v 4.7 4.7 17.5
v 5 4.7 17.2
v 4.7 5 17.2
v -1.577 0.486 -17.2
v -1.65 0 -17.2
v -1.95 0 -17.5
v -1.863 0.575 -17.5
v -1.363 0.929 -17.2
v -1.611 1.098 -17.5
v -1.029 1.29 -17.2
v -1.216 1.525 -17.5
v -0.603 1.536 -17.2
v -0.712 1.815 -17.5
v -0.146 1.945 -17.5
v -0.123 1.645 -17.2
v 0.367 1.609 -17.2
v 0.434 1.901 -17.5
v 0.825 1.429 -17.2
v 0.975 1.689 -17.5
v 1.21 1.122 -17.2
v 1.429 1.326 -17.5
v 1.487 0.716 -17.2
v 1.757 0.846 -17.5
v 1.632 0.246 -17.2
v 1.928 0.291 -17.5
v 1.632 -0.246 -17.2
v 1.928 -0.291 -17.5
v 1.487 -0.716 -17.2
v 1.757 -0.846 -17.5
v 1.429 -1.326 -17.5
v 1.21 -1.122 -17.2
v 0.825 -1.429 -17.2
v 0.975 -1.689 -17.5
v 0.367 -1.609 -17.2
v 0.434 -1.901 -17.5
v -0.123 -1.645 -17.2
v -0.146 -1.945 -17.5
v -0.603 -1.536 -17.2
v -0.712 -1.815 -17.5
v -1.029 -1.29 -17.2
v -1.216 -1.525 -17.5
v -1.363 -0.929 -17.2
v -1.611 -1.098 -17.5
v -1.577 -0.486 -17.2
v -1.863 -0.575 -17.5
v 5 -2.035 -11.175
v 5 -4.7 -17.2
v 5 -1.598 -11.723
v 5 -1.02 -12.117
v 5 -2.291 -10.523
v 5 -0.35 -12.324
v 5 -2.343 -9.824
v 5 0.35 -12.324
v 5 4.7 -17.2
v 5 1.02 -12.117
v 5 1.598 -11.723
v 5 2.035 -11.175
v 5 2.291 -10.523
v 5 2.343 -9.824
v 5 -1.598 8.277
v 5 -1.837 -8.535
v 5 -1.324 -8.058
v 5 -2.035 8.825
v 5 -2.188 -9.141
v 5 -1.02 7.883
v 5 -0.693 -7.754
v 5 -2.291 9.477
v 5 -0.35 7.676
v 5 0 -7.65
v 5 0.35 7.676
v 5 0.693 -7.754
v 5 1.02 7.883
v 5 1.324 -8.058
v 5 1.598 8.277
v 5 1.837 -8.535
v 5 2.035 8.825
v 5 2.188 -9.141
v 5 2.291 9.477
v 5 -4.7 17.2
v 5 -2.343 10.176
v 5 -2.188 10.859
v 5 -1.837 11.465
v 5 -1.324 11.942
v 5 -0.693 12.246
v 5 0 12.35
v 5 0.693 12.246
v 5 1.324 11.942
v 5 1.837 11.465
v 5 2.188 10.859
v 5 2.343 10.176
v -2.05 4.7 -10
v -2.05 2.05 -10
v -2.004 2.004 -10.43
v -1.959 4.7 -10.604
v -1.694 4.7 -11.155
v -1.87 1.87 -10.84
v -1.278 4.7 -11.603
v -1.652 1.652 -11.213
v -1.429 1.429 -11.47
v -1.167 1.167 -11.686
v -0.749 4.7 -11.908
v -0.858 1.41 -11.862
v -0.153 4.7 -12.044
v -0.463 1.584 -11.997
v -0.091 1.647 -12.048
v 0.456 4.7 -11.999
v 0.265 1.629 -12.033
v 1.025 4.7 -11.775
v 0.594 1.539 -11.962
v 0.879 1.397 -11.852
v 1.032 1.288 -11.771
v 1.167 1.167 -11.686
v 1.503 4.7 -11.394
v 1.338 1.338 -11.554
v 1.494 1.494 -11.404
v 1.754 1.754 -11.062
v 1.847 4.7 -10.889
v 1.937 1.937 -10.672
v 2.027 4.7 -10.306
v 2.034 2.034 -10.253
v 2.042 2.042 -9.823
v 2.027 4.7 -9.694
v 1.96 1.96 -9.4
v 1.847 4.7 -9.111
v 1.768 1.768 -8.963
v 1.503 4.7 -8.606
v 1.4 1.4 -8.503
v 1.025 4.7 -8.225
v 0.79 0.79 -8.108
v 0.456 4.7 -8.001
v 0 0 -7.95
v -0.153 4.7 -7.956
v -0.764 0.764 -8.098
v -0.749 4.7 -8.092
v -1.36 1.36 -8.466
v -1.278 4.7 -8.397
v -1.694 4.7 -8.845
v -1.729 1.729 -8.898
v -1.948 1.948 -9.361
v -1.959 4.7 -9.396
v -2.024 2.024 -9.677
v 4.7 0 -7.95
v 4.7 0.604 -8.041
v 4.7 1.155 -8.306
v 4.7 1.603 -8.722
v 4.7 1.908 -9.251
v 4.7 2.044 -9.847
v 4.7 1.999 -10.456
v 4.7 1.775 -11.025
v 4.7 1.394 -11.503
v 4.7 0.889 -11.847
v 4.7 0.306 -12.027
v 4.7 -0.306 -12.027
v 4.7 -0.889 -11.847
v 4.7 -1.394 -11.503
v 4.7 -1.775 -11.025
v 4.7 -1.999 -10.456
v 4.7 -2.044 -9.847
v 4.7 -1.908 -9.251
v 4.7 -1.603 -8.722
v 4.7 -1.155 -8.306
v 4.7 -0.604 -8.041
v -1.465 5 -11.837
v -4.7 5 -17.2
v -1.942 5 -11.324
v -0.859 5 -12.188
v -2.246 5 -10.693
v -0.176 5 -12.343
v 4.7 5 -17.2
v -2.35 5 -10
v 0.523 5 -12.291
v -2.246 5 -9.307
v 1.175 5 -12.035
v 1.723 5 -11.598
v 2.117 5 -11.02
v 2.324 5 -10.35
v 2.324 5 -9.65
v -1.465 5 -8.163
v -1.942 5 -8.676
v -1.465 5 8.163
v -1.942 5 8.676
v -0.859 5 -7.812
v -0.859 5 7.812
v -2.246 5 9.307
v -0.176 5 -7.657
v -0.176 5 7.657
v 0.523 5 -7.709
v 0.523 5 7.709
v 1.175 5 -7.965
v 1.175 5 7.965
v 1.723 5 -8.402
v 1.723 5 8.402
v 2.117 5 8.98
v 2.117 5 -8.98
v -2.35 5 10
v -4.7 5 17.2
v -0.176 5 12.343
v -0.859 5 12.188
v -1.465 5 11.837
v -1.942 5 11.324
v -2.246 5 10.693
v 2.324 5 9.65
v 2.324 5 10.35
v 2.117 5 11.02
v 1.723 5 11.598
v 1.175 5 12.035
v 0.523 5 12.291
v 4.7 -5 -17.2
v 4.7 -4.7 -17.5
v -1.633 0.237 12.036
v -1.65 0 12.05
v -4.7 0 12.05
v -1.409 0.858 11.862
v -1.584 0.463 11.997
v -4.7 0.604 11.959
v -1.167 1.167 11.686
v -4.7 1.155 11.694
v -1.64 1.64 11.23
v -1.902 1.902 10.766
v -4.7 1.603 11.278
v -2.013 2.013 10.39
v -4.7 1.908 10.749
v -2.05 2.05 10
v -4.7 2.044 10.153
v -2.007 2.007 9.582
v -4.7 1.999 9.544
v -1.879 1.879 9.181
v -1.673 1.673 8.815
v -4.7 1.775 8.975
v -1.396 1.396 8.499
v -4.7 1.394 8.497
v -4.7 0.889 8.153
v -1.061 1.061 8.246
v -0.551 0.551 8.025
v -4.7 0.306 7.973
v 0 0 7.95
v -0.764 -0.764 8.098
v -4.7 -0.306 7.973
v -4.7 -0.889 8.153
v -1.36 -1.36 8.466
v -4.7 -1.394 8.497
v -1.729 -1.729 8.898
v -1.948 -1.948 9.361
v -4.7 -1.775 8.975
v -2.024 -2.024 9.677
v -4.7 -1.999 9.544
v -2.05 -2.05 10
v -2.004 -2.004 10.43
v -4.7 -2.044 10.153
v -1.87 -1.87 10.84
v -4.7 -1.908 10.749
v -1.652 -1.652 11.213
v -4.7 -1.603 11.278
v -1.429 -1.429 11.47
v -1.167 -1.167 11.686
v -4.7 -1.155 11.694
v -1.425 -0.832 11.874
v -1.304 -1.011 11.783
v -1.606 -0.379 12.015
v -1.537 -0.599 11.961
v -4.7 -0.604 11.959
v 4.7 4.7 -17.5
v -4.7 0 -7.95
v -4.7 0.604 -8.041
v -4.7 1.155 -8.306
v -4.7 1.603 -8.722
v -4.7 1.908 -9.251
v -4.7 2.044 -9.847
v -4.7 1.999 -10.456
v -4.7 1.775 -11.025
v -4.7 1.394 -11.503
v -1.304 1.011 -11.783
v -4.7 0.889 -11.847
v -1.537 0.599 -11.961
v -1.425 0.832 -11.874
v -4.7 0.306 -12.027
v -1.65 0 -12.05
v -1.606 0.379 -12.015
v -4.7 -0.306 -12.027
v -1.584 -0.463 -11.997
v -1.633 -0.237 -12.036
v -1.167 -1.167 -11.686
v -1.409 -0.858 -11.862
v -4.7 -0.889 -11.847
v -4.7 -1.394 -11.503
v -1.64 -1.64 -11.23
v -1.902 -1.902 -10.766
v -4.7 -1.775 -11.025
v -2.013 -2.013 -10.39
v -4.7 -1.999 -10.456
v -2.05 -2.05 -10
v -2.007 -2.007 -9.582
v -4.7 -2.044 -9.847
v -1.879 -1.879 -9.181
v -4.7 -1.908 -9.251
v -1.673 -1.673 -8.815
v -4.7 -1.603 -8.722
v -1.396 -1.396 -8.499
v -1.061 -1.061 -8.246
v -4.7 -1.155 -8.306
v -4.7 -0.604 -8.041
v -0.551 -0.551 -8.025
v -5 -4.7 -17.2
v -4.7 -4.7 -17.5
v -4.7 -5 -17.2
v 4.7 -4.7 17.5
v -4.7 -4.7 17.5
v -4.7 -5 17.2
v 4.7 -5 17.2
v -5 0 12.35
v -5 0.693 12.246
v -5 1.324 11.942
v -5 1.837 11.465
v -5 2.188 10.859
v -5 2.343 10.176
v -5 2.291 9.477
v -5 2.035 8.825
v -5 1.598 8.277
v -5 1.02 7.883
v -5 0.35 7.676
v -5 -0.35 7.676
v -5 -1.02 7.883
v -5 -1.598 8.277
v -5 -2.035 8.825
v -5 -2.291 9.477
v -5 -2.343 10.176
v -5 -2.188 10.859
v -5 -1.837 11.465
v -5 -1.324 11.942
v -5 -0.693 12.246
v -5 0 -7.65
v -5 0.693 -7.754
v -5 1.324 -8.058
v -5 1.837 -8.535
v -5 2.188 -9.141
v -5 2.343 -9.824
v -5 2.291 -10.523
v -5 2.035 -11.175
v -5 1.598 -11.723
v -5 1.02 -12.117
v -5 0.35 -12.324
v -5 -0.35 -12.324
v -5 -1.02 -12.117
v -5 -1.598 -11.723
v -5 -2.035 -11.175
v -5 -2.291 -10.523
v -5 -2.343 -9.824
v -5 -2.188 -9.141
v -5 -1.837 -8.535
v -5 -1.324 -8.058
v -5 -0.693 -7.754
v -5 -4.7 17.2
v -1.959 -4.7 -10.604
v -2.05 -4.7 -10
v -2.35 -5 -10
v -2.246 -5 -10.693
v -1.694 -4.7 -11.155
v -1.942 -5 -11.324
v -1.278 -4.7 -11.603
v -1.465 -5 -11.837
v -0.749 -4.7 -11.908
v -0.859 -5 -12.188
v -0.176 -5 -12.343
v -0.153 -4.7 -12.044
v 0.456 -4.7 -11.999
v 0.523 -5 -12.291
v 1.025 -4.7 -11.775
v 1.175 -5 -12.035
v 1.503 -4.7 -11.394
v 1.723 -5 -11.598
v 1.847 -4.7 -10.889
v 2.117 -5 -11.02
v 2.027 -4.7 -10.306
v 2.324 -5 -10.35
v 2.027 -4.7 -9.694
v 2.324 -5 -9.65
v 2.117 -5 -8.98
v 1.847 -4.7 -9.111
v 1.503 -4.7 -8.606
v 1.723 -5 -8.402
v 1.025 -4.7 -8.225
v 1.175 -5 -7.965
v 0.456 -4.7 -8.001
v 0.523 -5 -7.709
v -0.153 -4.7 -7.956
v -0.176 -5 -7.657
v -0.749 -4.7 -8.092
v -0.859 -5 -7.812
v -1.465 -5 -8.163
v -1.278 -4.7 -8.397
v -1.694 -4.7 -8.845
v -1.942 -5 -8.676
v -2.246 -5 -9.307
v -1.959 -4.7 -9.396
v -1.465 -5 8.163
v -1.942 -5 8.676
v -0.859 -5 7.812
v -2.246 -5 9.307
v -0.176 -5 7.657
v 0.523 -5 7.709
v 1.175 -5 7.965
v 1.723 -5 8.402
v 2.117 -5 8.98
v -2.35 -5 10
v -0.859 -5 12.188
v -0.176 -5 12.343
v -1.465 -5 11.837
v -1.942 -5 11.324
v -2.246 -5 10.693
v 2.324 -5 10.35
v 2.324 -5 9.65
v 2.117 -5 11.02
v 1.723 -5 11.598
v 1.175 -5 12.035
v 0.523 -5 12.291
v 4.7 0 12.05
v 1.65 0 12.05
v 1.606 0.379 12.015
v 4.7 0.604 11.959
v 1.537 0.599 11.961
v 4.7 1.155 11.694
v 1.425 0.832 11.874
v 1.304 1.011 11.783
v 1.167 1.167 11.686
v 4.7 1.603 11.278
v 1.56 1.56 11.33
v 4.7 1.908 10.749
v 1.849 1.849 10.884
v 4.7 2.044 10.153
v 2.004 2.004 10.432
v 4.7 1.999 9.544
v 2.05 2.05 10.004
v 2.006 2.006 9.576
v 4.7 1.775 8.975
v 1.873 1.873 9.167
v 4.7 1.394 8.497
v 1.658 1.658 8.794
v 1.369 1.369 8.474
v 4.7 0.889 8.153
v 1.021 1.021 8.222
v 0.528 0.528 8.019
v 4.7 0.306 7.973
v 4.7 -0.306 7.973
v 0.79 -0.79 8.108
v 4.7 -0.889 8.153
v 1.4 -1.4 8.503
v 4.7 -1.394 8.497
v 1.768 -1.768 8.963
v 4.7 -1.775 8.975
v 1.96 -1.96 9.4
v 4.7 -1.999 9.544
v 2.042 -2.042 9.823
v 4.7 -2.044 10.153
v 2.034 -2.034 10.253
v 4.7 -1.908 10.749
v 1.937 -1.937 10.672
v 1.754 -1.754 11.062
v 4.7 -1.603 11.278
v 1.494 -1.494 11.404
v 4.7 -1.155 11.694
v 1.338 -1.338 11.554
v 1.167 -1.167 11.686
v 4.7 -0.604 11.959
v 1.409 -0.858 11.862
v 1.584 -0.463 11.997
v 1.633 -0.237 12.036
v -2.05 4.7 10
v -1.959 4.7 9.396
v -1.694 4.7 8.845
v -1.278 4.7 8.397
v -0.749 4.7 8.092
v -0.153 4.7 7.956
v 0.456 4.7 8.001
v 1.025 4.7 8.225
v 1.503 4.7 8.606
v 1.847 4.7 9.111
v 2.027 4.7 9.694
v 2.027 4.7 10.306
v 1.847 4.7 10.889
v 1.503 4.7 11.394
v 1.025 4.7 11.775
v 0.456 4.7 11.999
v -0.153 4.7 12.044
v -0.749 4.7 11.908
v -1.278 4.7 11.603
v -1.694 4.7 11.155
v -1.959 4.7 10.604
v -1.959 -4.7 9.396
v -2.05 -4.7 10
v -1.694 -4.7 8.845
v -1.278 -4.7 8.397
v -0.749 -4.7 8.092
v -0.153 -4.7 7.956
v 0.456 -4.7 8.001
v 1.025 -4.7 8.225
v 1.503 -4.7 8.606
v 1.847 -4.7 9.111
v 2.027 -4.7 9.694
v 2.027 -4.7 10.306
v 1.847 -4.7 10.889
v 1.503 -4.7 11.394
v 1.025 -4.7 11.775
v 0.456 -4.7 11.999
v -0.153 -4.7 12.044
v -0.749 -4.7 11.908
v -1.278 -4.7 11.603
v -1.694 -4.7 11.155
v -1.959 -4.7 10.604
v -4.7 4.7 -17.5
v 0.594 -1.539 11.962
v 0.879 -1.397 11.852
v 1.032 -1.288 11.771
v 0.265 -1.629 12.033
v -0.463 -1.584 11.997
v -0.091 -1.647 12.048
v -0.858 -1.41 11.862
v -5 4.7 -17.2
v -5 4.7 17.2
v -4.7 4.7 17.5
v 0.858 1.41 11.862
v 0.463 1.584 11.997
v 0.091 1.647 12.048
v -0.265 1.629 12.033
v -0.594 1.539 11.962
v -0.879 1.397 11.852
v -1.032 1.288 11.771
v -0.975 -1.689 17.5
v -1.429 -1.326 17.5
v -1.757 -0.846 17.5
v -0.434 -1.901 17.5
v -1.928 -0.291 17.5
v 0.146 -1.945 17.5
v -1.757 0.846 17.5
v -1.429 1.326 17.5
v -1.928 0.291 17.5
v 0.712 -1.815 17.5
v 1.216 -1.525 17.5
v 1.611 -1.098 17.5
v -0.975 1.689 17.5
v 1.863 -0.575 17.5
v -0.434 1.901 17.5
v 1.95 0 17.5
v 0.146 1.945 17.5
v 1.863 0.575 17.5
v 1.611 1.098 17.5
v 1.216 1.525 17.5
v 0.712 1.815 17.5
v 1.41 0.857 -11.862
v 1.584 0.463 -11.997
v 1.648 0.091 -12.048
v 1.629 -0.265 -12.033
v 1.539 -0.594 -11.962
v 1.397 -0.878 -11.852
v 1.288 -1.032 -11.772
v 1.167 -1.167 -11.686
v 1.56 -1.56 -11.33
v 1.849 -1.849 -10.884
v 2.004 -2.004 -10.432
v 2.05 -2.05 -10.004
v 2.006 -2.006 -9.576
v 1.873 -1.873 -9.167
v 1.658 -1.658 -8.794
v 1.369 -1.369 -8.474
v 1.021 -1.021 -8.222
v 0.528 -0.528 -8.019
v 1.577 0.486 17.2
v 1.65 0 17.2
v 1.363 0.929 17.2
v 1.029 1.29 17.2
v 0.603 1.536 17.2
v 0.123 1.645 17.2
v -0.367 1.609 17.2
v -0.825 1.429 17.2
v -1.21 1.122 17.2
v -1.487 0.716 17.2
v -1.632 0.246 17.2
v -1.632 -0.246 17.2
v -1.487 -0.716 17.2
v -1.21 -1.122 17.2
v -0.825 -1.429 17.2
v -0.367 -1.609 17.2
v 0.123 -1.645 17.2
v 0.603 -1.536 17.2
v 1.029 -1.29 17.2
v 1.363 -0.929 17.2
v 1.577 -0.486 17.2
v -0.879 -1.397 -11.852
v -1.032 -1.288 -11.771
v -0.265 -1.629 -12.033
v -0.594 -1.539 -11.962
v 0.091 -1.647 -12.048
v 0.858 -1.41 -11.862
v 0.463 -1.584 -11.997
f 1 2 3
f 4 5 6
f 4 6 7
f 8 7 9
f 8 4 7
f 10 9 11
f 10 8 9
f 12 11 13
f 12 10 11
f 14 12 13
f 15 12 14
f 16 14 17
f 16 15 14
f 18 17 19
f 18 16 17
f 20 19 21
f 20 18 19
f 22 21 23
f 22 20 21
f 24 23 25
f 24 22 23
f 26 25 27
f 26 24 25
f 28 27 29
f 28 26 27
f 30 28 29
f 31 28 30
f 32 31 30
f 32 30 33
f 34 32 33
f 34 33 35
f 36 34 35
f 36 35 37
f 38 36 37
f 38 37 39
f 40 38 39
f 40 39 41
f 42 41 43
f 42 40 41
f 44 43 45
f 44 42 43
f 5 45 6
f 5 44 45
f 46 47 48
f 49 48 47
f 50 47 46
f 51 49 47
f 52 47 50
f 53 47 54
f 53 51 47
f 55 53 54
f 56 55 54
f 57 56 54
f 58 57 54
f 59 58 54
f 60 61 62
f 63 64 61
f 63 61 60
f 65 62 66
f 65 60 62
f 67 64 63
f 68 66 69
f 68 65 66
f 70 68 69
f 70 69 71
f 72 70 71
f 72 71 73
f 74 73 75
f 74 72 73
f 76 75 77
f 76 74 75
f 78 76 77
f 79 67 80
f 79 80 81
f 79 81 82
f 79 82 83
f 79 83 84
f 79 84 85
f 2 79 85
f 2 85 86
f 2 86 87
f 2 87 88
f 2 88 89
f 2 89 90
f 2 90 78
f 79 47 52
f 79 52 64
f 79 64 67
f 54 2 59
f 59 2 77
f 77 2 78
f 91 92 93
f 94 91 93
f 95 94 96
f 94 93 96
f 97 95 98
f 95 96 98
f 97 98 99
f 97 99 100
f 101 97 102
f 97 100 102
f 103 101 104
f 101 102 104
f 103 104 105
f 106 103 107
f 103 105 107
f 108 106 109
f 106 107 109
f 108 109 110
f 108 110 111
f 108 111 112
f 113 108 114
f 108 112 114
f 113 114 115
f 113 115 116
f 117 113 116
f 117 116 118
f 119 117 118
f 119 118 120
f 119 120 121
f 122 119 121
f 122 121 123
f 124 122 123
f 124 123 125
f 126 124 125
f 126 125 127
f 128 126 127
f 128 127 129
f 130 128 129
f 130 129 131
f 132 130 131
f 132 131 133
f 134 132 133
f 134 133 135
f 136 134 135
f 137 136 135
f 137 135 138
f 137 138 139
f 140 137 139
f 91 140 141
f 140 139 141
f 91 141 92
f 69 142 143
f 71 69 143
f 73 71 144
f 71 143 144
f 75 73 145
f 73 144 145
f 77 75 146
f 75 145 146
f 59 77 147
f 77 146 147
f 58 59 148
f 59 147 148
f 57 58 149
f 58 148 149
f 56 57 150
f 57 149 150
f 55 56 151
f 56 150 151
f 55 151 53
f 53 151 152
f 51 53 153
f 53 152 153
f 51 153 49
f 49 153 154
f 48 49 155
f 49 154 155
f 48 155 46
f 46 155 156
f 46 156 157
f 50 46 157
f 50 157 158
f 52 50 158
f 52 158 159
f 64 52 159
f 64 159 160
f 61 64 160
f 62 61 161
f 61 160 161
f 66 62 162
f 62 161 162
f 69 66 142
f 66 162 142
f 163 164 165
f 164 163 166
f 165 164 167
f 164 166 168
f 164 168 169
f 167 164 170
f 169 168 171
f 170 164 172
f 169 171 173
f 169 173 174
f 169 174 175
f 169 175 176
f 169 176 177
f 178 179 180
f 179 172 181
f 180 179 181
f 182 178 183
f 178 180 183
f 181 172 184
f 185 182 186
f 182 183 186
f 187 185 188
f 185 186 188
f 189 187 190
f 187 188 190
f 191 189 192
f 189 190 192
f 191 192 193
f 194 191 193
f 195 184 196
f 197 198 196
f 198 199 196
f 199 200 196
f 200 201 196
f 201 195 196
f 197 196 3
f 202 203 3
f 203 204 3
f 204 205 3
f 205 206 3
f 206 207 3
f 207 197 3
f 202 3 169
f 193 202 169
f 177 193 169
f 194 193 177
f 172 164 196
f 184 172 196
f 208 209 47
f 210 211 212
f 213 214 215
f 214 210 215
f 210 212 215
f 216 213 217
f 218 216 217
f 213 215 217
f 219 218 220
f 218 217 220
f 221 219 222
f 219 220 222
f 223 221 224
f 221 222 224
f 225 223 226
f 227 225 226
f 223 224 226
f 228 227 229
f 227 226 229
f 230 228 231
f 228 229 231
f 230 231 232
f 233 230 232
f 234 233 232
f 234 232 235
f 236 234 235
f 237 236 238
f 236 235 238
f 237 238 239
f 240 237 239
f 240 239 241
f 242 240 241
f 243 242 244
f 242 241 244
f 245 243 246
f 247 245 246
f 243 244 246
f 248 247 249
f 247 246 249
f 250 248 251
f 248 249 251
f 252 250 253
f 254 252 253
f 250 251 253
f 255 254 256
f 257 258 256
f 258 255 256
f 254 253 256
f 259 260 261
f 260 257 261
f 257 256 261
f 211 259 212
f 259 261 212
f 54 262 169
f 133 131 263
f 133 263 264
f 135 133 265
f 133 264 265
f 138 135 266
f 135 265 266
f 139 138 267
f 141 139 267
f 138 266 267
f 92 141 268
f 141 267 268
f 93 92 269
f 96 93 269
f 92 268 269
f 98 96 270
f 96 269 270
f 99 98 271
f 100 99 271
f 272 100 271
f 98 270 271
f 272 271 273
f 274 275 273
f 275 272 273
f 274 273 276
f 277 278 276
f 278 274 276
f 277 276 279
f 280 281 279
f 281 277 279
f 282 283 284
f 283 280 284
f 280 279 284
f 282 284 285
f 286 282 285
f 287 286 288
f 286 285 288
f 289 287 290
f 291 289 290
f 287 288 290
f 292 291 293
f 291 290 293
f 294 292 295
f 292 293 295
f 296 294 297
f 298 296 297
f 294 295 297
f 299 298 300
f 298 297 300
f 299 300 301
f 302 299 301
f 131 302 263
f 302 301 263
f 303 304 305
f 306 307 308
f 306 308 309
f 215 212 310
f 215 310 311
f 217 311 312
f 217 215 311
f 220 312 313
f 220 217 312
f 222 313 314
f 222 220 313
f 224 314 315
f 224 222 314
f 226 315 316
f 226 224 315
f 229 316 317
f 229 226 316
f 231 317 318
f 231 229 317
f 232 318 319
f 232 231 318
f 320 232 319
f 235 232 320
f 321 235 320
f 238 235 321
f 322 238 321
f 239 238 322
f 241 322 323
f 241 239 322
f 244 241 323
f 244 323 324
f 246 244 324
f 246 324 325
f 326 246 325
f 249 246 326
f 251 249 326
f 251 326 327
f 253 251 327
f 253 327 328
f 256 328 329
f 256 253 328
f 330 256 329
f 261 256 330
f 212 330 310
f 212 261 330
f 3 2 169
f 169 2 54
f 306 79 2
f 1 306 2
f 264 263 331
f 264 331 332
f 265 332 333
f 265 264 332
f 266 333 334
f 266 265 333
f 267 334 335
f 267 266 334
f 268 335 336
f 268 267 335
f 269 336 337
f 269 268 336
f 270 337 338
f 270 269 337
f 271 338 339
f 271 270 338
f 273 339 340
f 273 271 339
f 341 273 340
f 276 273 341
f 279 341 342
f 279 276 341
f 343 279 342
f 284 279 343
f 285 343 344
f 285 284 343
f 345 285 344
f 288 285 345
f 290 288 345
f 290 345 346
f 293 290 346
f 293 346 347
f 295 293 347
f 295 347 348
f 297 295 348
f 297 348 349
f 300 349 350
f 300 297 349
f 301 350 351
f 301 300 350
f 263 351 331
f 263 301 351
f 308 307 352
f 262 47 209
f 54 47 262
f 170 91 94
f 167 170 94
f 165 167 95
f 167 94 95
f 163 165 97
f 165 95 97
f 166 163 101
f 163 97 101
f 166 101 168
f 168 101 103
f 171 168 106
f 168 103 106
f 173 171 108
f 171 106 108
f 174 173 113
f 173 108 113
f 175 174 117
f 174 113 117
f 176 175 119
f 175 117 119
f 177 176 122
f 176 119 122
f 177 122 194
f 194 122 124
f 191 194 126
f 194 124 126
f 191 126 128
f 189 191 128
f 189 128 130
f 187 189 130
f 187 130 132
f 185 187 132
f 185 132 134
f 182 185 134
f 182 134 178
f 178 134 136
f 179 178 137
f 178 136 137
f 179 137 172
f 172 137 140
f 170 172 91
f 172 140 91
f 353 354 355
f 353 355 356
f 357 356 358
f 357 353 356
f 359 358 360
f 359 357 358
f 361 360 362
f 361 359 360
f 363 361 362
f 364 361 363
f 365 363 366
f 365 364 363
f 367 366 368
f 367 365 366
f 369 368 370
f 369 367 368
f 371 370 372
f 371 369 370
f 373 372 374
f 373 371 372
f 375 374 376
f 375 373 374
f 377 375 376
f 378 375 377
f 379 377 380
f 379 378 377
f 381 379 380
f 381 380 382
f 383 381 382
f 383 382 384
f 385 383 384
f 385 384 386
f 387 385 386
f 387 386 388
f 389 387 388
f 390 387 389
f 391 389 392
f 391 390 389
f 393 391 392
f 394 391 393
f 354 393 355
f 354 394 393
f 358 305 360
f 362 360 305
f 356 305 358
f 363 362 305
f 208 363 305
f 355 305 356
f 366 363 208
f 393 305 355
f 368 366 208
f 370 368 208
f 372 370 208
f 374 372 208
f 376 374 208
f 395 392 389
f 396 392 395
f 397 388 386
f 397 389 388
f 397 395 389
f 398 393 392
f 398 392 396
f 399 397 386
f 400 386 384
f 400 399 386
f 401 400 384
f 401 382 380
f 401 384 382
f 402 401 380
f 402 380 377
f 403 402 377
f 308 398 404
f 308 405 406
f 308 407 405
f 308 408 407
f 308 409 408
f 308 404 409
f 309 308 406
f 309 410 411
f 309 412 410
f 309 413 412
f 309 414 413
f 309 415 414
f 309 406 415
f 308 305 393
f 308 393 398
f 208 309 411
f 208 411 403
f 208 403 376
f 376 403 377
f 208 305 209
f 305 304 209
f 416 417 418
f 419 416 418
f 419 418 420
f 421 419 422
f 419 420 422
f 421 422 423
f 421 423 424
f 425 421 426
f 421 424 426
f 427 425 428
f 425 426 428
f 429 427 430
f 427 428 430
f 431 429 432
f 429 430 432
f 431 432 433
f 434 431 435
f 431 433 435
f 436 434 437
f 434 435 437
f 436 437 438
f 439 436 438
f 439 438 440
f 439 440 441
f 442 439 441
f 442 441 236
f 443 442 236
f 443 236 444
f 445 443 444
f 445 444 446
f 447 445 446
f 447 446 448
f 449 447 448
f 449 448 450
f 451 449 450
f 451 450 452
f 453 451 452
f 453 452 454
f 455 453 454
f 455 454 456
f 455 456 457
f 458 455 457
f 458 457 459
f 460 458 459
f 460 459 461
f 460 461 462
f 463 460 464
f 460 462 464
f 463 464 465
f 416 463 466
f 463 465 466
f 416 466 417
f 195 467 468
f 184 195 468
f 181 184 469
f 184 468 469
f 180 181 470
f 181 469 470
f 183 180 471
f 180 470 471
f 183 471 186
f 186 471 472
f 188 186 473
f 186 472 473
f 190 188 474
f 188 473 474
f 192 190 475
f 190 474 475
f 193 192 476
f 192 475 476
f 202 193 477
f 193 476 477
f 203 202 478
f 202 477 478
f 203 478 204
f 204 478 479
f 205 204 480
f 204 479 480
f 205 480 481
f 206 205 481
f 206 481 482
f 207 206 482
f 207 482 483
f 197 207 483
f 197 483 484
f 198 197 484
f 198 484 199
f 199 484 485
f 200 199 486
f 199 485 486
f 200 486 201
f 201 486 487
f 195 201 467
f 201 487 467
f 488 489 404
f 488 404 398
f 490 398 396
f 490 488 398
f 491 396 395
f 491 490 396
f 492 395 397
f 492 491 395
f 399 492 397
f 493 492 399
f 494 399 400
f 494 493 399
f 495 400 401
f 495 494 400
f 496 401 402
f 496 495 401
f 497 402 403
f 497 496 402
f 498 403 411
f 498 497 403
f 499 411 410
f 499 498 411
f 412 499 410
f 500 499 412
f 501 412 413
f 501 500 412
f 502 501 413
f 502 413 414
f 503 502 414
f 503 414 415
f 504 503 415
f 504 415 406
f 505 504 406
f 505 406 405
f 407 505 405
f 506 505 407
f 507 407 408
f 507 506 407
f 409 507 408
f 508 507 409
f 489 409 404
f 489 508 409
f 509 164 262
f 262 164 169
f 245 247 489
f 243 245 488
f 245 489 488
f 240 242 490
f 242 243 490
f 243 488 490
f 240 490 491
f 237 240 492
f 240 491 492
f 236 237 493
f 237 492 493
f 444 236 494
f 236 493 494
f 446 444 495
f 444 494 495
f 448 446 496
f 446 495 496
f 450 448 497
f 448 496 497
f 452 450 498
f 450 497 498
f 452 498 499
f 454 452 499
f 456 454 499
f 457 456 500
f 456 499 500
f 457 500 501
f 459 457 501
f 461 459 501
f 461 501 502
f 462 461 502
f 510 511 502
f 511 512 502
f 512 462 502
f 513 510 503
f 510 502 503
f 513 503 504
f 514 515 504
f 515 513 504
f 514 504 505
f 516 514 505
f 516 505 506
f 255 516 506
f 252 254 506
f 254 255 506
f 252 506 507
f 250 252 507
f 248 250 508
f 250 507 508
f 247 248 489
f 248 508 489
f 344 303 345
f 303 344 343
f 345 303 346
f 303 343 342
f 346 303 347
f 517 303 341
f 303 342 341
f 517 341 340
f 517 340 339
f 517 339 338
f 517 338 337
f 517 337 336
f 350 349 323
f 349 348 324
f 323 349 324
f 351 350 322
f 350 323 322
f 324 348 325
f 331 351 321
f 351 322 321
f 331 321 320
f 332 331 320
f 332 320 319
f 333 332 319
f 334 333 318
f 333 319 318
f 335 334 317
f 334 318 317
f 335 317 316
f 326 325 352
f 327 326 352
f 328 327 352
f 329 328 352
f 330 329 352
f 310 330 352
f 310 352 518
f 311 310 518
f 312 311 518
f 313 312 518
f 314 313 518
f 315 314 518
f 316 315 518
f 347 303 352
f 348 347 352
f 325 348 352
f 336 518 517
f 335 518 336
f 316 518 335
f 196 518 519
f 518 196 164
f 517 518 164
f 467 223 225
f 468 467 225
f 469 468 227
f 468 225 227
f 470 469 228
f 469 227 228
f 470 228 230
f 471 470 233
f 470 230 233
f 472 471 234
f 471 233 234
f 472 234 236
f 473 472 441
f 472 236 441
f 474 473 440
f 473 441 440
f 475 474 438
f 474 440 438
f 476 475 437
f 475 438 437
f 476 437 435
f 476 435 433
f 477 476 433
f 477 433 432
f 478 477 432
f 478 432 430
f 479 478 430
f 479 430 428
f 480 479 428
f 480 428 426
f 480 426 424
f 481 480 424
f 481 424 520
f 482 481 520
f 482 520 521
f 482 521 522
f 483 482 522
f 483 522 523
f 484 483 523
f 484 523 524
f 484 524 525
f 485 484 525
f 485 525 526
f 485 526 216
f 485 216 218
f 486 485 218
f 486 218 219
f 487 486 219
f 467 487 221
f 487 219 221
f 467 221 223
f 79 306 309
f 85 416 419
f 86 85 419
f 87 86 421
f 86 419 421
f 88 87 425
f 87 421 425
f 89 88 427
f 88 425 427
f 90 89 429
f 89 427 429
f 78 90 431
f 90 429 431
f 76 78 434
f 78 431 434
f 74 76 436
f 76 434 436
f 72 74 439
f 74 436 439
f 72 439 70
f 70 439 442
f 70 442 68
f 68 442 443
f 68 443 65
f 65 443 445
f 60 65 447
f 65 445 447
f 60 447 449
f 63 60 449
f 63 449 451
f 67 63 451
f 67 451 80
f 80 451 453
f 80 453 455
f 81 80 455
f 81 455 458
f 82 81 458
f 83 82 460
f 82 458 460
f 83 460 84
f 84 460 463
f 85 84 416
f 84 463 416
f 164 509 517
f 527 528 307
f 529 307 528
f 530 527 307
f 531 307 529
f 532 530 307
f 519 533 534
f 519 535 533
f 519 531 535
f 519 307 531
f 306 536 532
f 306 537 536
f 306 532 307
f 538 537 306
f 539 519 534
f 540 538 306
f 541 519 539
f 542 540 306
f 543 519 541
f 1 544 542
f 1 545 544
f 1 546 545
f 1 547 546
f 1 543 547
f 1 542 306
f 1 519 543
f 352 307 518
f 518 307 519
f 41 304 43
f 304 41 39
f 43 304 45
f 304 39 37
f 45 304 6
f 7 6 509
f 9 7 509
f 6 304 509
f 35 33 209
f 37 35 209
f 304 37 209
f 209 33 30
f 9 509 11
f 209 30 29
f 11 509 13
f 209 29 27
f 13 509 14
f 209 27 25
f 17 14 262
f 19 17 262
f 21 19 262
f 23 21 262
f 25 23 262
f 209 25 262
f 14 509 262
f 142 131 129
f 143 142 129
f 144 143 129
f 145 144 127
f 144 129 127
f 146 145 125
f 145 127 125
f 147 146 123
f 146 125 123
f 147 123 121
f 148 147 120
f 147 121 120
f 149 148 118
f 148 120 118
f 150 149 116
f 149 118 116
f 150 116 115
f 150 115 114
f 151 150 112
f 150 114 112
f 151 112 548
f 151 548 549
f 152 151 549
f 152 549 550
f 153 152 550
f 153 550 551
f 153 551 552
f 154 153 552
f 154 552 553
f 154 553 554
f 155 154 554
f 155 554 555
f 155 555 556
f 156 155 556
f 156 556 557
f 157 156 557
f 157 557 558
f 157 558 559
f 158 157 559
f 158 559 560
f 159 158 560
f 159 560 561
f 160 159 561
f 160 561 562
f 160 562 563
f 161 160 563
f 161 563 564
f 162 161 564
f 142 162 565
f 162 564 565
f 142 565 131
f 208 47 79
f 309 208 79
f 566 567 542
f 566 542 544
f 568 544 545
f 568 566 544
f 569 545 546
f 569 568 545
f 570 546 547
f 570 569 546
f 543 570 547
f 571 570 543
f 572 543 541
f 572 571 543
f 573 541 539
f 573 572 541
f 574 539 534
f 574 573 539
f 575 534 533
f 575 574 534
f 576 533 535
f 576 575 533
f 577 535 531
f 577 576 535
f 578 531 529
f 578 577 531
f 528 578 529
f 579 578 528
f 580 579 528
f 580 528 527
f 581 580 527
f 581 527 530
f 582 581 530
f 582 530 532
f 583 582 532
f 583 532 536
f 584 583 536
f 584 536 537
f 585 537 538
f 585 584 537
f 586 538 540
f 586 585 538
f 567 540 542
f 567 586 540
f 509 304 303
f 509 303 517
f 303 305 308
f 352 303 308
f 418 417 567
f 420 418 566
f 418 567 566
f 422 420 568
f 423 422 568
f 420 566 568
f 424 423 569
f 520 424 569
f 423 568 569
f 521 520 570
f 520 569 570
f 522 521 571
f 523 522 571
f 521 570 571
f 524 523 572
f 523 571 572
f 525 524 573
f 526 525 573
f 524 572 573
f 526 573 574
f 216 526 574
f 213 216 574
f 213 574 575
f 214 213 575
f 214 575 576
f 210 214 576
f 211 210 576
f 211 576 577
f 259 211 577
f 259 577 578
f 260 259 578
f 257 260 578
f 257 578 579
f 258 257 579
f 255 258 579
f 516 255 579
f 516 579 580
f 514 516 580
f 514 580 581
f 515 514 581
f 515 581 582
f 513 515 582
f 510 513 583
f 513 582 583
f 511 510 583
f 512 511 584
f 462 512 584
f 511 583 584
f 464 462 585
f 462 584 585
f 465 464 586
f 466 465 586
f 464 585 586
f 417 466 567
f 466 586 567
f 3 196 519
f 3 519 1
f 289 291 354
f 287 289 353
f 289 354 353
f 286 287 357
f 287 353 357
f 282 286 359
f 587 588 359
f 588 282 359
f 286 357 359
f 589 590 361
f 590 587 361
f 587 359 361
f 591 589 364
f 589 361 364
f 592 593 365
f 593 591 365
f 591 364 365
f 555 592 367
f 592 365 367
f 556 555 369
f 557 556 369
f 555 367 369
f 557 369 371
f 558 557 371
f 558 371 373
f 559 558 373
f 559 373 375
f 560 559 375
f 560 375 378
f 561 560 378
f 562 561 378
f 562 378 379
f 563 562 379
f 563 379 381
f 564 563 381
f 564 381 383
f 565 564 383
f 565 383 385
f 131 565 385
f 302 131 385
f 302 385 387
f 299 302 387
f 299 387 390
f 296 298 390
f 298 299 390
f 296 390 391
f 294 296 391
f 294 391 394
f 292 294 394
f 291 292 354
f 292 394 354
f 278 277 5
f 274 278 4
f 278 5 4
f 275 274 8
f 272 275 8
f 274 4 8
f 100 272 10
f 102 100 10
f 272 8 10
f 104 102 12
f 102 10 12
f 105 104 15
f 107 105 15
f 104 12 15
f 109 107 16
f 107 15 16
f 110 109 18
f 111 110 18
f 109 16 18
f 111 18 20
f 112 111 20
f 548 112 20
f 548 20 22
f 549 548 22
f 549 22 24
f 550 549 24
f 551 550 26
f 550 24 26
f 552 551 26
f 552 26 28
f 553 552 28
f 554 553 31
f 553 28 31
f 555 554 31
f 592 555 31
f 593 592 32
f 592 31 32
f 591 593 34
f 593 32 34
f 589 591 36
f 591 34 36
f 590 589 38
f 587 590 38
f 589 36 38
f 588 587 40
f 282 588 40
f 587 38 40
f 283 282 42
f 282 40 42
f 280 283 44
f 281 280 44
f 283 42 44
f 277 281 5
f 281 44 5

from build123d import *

# Parameters (mm, degrees)
SKETCH_1_W              = 10
SKETCH_1_H              = 10
EXTRUDE_1_DEPTH         = 17.5
HOLE_WIZARD_4_1_4_1_1_D = 4.1
HOLE_WIZARD_4_1_4_1_2_D = 4.1
HOLE_WIZARD_M4_1_REACH  = 37.707
HOLE_WIZARD_M4_1_BORE_R = 1.65
HOLE_WIZARD_M4_2_REACH  = 37.707
HOLE_WIZARD_M4_2_BORE_R = 1.65
CHAMFER_1_SIZE          = 0.3


with BuildPart() as part:
    # 草图1 → 凸台-拉伸1 (new, symmetric)
    with BuildSketch(Plane.XY):
        Rectangle(SKETCH_1_W, SKETCH_1_H)
    extrude(amount=EXTRUDE_1_DEPTH, both=True)

    # Ø4.1 (4.1) 直径孔1 (through all)
    with Locations(Plane(origin=(5, 0, 0), x_dir=(0, 0, -1), z_dir=(1, 0, 0))):
        with Locations((-10, 0), (10, 0)):
            Hole(HOLE_WIZARD_4_1_4_1_1_D / 2)

    # Ø4.1 (4.1) 直径孔2 (through all)
    with Locations(Plane(origin=(0, 5, 0), x_dir=(1, 0, 0), z_dir=(0, 1, 0))):
        with Locations((0, -10), (0, 10)):
            Hole(HOLE_WIZARD_4_1_4_1_2_D / 2)

    # M4 螺纹孔1 bore → M4 螺纹孔1 (cut, up to next)
    with BuildSketch(Plane.XY.offset(17.5), mode=Mode.PRIVATE) as hole_wizard_m4_1_sk1:
        Circle(HOLE_WIZARD_M4_1_BORE_R)
    hole_wizard_m4_1_tool1 = extrude(hole_wizard_m4_1_sk1.sketch, amount=-HOLE_WIZARD_M4_1_REACH, mode=Mode.PRIVATE) & part.part
    add(hole_wizard_m4_1_tool1.solids().sort_by_distance((0, 0, 17.5))[0], mode=Mode.SUBTRACT)

    # M4 螺纹孔2 bore → M4 螺纹孔2 (cut, up to next)
    with BuildSketch(Plane(origin=(0, 0, -17.5), x_dir=(-1, 0, 0), z_dir=(0, 0, -1)), mode=Mode.PRIVATE) as hole_wizard_m4_2_sk1:
        Circle(HOLE_WIZARD_M4_2_BORE_R)
    hole_wizard_m4_2_tool1 = extrude(hole_wizard_m4_2_sk1.sketch, amount=-HOLE_WIZARD_M4_2_REACH, mode=Mode.PRIVATE) & part.part
    add(hole_wizard_m4_2_tool1.solids().sort_by_distance((0, 0, -17.5))[0], mode=Mode.SUBTRACT)

    # 倒角1
    chamfer_1_edges = [part.edges().sort_by_distance(p)[0] for p in [
        (-5, 0, 17.5),
        (5, 0, -12.05),
        (-5, 0, -12.05),
        (0, -5, 17.5),
        (5, 0, 7.95),
        (-5, 0, 7.95),
        (2.05, -5, -10),
        (2.05, 5, -10),
        (2.05, -5, 10),
        (2.05, 5, 10),
        (5, 0, 17.5),
        (0, -5, -17.5),
        (-5, 0, -17.5),
        (-1.65, 0, 17.5),
        (0, 5, -17.5),
        (5, 0, -17.5),
        (1.65, 0, -17.5),
        (5, -5, 0),
        (-5, -5, 0),
        (-5, 5, 0),
        (5, 5, 0),
        (0, 5, 17.5),
    ]]
    chamfer(chamfer_1_edges, length=CHAMFER_1_SIZE)


solid = part.part
